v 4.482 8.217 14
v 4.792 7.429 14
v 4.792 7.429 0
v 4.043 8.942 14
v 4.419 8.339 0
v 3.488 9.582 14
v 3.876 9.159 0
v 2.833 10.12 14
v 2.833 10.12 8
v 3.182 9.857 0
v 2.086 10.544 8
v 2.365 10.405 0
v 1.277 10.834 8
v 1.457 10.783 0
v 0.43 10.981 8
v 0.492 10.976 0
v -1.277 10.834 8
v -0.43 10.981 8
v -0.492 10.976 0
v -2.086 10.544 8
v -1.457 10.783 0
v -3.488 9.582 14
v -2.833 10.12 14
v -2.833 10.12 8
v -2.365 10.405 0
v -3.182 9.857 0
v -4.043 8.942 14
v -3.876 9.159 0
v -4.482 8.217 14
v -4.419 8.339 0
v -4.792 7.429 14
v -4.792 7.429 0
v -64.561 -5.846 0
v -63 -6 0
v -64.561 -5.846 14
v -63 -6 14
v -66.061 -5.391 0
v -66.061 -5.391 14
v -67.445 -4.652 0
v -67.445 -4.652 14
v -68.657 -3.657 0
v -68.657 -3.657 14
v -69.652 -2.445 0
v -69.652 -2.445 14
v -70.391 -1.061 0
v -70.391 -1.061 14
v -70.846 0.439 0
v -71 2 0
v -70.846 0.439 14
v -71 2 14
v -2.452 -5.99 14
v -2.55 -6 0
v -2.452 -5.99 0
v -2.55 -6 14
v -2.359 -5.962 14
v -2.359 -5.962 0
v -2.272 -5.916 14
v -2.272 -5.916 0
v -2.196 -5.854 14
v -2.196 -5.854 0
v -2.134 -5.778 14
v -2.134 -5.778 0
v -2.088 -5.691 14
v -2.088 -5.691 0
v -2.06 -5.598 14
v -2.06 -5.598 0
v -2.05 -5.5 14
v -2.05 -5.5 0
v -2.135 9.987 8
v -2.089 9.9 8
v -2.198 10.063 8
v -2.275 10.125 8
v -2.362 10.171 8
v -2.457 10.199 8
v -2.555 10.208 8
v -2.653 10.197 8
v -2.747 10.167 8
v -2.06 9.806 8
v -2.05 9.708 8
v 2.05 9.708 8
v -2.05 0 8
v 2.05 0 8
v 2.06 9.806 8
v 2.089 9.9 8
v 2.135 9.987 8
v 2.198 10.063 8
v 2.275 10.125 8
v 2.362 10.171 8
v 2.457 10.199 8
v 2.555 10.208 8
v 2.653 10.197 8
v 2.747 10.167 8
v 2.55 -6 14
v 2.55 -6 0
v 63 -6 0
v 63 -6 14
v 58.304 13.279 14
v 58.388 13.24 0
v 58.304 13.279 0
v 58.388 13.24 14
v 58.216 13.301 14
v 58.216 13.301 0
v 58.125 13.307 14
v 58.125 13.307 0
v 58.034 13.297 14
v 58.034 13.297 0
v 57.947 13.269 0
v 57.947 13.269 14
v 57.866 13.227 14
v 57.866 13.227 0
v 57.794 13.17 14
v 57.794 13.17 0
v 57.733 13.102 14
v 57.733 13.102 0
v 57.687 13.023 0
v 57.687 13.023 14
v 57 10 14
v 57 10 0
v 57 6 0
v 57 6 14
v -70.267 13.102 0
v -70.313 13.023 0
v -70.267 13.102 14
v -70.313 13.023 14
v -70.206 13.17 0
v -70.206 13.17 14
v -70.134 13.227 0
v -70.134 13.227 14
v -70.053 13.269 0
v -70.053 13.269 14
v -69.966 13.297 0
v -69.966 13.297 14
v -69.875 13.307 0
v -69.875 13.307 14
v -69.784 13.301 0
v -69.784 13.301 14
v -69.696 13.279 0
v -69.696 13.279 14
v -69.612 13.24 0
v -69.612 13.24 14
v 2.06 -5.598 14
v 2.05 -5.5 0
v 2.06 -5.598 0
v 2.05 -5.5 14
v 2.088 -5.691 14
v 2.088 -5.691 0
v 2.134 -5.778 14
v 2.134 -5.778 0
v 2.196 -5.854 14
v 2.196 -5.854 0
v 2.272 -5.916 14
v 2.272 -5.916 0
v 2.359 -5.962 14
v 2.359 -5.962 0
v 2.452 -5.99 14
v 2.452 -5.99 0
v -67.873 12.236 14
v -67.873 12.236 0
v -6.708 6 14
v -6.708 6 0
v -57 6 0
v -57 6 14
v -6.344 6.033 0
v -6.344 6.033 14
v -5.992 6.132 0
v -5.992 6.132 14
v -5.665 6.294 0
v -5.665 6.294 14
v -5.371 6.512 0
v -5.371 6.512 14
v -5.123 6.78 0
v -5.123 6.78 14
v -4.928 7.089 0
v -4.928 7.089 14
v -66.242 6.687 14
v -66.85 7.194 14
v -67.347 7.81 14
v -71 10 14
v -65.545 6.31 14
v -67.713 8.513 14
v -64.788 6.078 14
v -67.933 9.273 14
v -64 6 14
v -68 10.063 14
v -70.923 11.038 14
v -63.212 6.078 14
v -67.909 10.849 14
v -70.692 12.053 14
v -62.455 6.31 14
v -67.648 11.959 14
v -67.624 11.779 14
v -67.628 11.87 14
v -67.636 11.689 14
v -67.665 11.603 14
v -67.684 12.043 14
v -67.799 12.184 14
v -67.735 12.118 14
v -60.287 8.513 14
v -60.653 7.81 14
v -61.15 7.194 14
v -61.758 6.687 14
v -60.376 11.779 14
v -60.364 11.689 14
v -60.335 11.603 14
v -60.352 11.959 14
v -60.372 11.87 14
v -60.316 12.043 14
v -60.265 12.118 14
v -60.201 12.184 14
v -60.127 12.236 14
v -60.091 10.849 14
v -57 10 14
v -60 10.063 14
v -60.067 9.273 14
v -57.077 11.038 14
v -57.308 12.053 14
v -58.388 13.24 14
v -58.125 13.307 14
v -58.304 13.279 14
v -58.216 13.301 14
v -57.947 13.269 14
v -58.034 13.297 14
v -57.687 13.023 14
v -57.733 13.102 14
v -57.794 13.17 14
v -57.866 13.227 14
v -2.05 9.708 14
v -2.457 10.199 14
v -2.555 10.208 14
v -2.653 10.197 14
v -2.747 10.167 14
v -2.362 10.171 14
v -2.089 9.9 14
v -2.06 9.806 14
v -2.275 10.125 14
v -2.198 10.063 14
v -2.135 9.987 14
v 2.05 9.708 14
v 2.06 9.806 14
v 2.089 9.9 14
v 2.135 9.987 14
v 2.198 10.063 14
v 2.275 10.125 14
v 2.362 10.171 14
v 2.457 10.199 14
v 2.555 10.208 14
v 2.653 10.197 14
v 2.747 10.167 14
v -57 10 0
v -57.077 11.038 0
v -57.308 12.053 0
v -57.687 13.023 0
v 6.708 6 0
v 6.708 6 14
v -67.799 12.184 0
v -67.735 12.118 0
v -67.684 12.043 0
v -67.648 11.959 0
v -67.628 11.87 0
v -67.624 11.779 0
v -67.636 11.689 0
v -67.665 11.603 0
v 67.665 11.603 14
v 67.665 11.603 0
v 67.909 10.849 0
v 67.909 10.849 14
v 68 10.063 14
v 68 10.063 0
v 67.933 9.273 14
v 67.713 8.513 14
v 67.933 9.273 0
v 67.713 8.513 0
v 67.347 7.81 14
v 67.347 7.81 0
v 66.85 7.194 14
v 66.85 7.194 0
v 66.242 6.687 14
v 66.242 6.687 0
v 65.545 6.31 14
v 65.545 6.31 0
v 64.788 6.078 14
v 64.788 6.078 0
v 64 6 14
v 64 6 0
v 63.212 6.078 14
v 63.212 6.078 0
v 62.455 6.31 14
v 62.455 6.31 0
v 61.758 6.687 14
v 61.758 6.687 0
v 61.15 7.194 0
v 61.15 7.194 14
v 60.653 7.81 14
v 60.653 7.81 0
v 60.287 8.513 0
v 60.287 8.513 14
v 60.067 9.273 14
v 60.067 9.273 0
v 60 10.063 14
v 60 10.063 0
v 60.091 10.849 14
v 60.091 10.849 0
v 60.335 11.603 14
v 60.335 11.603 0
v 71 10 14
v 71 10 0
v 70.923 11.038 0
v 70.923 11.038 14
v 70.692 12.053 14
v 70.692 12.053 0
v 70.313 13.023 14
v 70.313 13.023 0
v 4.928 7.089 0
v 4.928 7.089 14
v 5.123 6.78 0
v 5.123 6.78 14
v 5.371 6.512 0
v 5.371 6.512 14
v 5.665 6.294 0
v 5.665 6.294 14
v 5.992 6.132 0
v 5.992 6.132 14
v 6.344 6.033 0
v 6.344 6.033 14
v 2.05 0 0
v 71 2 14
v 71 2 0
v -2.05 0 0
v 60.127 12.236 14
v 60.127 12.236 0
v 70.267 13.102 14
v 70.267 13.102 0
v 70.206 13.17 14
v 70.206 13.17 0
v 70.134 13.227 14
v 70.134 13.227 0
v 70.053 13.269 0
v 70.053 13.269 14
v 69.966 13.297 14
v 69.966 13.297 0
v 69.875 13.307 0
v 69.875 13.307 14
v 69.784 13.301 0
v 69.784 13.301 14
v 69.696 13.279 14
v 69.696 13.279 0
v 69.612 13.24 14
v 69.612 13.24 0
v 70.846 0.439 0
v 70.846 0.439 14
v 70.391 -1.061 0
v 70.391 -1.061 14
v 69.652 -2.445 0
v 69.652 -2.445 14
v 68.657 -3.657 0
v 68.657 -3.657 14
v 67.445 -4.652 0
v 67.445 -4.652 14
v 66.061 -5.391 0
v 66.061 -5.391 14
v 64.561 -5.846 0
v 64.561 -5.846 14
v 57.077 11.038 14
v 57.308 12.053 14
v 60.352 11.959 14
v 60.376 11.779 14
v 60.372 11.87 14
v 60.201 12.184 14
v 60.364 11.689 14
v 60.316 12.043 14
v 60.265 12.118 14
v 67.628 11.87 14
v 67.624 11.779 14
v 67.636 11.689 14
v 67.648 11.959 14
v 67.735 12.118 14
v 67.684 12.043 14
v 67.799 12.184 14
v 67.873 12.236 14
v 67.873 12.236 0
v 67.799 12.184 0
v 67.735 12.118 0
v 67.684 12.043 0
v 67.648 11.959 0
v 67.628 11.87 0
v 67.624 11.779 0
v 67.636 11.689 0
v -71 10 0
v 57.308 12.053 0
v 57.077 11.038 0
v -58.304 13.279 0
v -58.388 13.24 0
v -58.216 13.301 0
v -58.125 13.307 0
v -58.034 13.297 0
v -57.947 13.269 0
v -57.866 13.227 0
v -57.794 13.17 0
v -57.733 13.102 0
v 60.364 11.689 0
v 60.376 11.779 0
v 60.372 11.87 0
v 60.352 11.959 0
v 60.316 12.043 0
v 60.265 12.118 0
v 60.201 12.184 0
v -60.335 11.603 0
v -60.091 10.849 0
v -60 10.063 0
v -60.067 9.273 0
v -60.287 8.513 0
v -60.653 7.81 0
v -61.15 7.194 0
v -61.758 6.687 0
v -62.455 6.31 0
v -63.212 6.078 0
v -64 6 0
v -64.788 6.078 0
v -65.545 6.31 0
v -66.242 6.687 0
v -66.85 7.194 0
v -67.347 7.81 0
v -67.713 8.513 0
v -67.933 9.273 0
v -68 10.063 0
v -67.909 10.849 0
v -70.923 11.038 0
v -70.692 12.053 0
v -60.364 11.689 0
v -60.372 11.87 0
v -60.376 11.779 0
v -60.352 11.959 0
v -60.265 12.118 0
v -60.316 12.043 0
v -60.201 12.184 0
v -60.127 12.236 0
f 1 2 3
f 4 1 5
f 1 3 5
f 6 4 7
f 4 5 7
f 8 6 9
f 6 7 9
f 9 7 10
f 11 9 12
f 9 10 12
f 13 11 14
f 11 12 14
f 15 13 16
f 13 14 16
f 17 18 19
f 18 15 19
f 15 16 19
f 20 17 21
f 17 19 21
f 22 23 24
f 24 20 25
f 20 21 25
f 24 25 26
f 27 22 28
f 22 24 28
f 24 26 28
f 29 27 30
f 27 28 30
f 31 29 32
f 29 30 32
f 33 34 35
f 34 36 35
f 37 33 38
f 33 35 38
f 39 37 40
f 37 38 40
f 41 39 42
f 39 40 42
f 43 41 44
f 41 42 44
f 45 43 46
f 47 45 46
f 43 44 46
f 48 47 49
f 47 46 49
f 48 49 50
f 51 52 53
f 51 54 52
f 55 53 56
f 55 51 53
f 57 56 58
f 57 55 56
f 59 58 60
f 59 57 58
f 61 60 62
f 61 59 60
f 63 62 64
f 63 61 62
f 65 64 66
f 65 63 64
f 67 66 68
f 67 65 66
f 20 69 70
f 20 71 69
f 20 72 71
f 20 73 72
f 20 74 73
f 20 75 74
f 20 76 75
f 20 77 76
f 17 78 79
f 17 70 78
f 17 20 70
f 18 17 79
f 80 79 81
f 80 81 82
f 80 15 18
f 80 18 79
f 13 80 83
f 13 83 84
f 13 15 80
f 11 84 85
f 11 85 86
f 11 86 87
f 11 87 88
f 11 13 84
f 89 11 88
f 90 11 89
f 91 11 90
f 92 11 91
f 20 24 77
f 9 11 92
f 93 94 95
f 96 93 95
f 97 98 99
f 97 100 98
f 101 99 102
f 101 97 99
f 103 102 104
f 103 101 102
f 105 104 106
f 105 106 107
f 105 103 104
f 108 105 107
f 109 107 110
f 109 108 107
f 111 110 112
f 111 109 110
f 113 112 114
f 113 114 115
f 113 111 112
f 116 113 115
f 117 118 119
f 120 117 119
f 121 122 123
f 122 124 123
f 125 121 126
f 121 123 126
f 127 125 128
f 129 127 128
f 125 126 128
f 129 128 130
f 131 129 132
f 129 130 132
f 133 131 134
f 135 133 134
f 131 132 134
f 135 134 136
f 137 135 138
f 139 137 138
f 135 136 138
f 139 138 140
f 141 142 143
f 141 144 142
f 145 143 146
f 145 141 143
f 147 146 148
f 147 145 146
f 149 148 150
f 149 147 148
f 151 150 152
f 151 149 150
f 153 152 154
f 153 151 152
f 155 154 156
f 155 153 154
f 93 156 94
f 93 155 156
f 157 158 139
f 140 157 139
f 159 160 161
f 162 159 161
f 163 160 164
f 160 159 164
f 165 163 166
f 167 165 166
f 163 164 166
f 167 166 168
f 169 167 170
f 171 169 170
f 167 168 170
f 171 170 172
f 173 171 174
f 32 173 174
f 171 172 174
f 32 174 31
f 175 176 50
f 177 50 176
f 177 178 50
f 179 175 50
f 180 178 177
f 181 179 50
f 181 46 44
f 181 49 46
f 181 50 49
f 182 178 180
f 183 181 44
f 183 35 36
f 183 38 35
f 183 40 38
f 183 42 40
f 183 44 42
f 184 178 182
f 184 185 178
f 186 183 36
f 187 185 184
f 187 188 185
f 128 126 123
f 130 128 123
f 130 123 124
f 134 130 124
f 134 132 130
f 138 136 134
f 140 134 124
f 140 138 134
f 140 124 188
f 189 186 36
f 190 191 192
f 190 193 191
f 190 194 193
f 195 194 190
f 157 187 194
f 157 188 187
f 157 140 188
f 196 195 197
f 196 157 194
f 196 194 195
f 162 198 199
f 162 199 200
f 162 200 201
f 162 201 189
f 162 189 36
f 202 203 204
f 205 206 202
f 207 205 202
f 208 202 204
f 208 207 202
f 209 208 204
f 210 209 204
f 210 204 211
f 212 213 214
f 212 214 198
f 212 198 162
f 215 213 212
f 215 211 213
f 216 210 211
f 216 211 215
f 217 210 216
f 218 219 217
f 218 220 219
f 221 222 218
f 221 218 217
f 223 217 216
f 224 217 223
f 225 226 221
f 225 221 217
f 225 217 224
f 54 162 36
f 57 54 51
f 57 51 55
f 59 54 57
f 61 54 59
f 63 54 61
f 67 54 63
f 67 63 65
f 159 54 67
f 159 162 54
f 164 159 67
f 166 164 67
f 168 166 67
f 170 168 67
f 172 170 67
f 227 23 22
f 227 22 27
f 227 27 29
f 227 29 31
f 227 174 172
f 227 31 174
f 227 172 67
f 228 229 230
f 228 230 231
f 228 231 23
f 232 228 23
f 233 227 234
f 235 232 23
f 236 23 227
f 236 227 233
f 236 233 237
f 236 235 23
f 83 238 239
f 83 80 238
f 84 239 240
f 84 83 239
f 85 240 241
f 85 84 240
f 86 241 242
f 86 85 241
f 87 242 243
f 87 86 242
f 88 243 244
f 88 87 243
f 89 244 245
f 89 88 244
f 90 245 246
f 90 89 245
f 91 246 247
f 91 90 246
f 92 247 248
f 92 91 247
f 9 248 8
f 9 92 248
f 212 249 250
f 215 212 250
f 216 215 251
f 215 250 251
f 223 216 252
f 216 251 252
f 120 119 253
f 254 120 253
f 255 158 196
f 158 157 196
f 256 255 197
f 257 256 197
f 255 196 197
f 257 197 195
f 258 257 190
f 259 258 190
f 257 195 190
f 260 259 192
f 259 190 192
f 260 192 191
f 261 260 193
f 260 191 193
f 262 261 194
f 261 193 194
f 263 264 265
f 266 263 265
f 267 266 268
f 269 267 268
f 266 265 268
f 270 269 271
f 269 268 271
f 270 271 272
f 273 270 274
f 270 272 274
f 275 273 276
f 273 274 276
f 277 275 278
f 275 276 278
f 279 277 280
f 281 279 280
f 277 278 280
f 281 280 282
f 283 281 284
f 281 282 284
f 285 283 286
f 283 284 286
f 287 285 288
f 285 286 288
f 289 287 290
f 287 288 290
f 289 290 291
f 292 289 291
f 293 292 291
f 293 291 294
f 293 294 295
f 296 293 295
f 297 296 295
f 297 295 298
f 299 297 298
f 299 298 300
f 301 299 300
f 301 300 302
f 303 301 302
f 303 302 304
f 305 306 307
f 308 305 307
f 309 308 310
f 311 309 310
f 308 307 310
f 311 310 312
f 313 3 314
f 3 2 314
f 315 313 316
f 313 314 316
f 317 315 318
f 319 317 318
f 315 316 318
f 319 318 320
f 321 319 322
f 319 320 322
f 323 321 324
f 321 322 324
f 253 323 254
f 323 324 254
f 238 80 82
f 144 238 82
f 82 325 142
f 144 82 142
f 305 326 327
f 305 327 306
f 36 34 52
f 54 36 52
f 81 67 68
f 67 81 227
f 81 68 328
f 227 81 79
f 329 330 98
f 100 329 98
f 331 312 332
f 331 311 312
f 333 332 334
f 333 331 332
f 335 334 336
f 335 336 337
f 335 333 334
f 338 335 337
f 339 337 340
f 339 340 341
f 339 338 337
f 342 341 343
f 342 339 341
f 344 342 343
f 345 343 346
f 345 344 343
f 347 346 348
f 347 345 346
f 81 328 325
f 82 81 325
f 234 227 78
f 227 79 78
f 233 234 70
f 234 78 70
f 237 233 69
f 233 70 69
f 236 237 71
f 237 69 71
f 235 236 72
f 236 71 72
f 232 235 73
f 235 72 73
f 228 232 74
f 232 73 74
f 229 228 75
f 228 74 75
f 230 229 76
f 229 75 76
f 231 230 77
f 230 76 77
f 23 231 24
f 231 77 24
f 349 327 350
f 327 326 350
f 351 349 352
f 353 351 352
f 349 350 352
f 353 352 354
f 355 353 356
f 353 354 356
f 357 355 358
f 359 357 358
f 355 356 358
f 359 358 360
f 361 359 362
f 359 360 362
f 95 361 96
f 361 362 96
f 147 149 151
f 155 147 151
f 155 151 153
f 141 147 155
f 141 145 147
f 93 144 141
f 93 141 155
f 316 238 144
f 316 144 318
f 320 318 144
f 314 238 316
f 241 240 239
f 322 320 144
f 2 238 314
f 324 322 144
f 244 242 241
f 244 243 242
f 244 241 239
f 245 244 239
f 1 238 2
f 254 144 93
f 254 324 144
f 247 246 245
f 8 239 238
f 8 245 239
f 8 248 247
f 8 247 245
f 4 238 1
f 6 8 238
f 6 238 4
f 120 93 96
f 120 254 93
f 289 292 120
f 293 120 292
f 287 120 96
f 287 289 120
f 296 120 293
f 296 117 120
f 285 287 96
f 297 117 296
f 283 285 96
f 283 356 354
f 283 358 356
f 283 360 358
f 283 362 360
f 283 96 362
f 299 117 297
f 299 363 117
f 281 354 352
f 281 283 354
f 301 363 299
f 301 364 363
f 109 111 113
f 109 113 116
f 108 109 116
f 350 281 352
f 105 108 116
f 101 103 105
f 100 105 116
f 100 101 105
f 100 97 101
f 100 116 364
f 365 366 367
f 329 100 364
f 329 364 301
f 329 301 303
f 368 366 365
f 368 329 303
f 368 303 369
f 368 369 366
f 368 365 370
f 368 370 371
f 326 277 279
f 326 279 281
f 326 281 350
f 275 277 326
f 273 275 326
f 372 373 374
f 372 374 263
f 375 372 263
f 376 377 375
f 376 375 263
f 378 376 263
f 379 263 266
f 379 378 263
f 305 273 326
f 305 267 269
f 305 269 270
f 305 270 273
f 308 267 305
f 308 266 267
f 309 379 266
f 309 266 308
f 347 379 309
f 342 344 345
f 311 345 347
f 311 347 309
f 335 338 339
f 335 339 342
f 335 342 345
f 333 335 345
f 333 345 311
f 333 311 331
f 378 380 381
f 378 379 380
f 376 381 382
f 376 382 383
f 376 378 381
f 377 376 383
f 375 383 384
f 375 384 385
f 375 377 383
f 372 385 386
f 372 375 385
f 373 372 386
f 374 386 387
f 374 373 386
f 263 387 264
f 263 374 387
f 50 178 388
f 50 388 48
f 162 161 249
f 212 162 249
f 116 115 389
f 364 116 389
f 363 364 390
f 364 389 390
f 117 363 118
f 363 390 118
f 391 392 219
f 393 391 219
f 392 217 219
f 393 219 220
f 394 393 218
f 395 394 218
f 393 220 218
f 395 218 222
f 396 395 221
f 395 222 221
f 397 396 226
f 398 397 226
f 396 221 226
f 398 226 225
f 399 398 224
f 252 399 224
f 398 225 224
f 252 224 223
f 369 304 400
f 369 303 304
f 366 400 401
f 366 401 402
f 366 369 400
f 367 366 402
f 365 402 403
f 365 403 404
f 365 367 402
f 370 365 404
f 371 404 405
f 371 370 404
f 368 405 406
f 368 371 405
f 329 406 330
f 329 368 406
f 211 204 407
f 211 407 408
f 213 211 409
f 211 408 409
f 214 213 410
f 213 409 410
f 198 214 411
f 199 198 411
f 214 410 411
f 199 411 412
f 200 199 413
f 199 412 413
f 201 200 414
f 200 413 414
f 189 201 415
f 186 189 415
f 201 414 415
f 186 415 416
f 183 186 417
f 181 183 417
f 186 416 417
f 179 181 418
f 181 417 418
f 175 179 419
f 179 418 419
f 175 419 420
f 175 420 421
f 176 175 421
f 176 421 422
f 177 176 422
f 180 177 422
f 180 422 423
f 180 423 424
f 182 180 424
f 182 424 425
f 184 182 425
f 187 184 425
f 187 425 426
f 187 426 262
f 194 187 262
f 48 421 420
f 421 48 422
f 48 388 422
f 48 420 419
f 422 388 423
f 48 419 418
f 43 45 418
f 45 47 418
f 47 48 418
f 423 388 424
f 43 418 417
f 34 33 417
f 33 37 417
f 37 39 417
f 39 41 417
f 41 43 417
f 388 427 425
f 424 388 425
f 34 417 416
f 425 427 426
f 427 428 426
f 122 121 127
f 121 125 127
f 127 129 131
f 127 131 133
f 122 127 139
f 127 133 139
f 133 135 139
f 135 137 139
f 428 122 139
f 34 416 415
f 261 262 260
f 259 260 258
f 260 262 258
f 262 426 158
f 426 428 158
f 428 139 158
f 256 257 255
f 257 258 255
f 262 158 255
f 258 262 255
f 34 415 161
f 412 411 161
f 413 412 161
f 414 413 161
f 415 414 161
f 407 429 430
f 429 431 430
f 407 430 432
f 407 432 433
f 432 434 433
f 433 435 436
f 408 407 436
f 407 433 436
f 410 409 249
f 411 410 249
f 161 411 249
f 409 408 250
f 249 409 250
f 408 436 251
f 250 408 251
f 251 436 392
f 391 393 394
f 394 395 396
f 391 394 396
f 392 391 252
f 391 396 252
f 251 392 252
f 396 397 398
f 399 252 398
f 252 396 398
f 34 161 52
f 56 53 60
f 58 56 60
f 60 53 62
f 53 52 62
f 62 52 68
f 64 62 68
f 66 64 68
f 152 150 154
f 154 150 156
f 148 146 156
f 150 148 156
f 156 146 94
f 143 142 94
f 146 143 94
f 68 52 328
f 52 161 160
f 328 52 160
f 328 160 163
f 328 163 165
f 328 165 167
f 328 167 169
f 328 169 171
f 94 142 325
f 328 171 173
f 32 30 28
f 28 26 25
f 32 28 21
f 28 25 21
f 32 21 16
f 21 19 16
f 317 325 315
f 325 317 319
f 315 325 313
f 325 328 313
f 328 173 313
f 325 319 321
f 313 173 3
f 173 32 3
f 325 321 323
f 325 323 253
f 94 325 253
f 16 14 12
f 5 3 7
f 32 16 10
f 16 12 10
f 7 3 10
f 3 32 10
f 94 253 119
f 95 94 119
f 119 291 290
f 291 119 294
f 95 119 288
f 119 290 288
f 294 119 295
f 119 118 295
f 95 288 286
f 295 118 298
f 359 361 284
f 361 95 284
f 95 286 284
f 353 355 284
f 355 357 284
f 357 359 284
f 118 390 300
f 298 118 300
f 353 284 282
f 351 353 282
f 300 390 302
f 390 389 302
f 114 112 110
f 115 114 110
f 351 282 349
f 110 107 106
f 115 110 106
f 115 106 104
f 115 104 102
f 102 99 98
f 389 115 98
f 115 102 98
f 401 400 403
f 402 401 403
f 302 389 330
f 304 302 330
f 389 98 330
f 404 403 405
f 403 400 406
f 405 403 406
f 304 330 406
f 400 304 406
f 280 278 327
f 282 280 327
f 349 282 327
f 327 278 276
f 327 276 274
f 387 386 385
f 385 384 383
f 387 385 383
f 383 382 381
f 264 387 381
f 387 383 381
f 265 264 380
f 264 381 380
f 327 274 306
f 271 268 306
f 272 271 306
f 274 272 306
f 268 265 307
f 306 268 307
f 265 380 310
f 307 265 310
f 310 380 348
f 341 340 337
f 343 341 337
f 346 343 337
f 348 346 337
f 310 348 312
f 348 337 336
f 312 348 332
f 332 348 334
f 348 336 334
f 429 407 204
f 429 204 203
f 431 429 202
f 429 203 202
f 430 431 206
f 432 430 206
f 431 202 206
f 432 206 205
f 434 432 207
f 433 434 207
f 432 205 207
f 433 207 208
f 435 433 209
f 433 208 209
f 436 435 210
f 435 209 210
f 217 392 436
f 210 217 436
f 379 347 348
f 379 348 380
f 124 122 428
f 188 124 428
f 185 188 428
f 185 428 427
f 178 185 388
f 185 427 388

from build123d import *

# Parameters (mm, degrees)
F1_DEPTH = 14
F2_W     = 4.1
F2_H     = 18.371435
F3_DEPTH = 6
F4_R     = 8
F5_R     = 0.5
F6_R     = 2


with BuildPart() as f1:
    # F0 (on Top) → F1 (new body)
    with BuildSketch(Plane.XY):
        with BuildLine():
            Line((-71, -6), (-2.05, -6))
            Line((-2.05, -6), (-2.05, 0))
            Line((-2.05, 0), (-2.05, 6))
            Line((-2.05, 6), (-5, 6))
            Line((-5, 6), (-57, 6))
            Line((-57, 6), (-57, 10))
            ThreePointArc((-57, 10), (-57.238519, 11.811733), (-57.937822, 13.5))
            Line((-57.937822, 13.5), (-60.535898, 12))
            ThreePointArc((-60.535898, 12), (-64, 6), (-67.464102, 12))
            Line((-67.464102, 12), (-70.062178, 13.5))
            ThreePointArc((-70.062178, 13.5), (-70.761481, 11.811733), (-71, 10))
            Line((-71, 10), (-71, 6))
            Line((-71, 6), (-71, -6))
        make_face()
        Polygon((-2.05, 6), (-2.05, 0), (0, 0), (2.05, 0), (2.05, 6), (0, 6), align=None)
        with BuildLine():
            Line((-5, 6), (-2.05, 6))
            Line((-2.05, 6), (0, 6))
            Line((0, 6), (2.05, 6))
            Line((2.05, 6), (5, 6))
            ThreePointArc((5, 6), (0, 11), (-5, 6))
        make_face()
        with BuildLine():
            Line((2.05, 6), (2.05, 0))
            Line((2.05, 0), (2.05, -6))
            Line((2.05, -6), (71, -6))
            Line((71, -6), (71, 6))
            Line((71, 6), (71, 10))
            ThreePointArc((71, 10), (70.761481, 11.811733), (70.062178, 13.5))
            Line((70.062178, 13.5), (67.464102, 12))
            ThreePointArc((67.464102, 12), (64, 6), (60.535898, 12))
            Line((60.535898, 12), (57.937822, 13.5))
            ThreePointArc((57.937822, 13.5), (57.238519, 11.811733), (57, 10))
            Line((57, 10), (57, 6))
            Line((57, 6), (5, 6))
            Line((5, 6), (2.05, 6))
        make_face()
    extrude(amount=F1_DEPTH)

    # F2 (on face) → F3 (cut)
    with BuildSketch(Plane.XY.offset(14)):
        with Locations((0, 9.185717)):
            Rectangle(F2_W, F2_H)
    extrude(amount=-F3_DEPTH, mode=Mode.SUBTRACT)

    # F4
    f4_edges = [f1.edges().sort_by_distance(p)[0] for p in [
        (71, -6, 7),
        (-71, -6, 7),
    ]]
    fillet(f4_edges, radius=F4_R)

    # F5
    f5_edges = [f1.edges().sort_by_distance(p)[0] for p in [
        (2.05, -6, 7),
        (-2.05, -6, 7),
        (-2.05, 10.560428, 11),
        (2.05, 10.560428, 11),
        (-67.464102, 12, 7),
        (-60.535898, 12, 7),
        (60.535898, 12, 7),
        (67.464102, 12, 7),
        (70.062178, 13.5, 7),
        (57.937822, 13.5, 7),
        (-57.937822, 13.5, 7),
        (-70.062178, 13.5, 7),
    ]]
    fillet(f5_edges, radius=F5_R)

    # F6
    f6_edges = [f1.edges().sort_by_distance(p)[0] for p in [
        (-5, 6, 7),
        (5, 6, 7),
    ]]
    fillet(f6_edges, radius=F6_R)


solid = f1.part
